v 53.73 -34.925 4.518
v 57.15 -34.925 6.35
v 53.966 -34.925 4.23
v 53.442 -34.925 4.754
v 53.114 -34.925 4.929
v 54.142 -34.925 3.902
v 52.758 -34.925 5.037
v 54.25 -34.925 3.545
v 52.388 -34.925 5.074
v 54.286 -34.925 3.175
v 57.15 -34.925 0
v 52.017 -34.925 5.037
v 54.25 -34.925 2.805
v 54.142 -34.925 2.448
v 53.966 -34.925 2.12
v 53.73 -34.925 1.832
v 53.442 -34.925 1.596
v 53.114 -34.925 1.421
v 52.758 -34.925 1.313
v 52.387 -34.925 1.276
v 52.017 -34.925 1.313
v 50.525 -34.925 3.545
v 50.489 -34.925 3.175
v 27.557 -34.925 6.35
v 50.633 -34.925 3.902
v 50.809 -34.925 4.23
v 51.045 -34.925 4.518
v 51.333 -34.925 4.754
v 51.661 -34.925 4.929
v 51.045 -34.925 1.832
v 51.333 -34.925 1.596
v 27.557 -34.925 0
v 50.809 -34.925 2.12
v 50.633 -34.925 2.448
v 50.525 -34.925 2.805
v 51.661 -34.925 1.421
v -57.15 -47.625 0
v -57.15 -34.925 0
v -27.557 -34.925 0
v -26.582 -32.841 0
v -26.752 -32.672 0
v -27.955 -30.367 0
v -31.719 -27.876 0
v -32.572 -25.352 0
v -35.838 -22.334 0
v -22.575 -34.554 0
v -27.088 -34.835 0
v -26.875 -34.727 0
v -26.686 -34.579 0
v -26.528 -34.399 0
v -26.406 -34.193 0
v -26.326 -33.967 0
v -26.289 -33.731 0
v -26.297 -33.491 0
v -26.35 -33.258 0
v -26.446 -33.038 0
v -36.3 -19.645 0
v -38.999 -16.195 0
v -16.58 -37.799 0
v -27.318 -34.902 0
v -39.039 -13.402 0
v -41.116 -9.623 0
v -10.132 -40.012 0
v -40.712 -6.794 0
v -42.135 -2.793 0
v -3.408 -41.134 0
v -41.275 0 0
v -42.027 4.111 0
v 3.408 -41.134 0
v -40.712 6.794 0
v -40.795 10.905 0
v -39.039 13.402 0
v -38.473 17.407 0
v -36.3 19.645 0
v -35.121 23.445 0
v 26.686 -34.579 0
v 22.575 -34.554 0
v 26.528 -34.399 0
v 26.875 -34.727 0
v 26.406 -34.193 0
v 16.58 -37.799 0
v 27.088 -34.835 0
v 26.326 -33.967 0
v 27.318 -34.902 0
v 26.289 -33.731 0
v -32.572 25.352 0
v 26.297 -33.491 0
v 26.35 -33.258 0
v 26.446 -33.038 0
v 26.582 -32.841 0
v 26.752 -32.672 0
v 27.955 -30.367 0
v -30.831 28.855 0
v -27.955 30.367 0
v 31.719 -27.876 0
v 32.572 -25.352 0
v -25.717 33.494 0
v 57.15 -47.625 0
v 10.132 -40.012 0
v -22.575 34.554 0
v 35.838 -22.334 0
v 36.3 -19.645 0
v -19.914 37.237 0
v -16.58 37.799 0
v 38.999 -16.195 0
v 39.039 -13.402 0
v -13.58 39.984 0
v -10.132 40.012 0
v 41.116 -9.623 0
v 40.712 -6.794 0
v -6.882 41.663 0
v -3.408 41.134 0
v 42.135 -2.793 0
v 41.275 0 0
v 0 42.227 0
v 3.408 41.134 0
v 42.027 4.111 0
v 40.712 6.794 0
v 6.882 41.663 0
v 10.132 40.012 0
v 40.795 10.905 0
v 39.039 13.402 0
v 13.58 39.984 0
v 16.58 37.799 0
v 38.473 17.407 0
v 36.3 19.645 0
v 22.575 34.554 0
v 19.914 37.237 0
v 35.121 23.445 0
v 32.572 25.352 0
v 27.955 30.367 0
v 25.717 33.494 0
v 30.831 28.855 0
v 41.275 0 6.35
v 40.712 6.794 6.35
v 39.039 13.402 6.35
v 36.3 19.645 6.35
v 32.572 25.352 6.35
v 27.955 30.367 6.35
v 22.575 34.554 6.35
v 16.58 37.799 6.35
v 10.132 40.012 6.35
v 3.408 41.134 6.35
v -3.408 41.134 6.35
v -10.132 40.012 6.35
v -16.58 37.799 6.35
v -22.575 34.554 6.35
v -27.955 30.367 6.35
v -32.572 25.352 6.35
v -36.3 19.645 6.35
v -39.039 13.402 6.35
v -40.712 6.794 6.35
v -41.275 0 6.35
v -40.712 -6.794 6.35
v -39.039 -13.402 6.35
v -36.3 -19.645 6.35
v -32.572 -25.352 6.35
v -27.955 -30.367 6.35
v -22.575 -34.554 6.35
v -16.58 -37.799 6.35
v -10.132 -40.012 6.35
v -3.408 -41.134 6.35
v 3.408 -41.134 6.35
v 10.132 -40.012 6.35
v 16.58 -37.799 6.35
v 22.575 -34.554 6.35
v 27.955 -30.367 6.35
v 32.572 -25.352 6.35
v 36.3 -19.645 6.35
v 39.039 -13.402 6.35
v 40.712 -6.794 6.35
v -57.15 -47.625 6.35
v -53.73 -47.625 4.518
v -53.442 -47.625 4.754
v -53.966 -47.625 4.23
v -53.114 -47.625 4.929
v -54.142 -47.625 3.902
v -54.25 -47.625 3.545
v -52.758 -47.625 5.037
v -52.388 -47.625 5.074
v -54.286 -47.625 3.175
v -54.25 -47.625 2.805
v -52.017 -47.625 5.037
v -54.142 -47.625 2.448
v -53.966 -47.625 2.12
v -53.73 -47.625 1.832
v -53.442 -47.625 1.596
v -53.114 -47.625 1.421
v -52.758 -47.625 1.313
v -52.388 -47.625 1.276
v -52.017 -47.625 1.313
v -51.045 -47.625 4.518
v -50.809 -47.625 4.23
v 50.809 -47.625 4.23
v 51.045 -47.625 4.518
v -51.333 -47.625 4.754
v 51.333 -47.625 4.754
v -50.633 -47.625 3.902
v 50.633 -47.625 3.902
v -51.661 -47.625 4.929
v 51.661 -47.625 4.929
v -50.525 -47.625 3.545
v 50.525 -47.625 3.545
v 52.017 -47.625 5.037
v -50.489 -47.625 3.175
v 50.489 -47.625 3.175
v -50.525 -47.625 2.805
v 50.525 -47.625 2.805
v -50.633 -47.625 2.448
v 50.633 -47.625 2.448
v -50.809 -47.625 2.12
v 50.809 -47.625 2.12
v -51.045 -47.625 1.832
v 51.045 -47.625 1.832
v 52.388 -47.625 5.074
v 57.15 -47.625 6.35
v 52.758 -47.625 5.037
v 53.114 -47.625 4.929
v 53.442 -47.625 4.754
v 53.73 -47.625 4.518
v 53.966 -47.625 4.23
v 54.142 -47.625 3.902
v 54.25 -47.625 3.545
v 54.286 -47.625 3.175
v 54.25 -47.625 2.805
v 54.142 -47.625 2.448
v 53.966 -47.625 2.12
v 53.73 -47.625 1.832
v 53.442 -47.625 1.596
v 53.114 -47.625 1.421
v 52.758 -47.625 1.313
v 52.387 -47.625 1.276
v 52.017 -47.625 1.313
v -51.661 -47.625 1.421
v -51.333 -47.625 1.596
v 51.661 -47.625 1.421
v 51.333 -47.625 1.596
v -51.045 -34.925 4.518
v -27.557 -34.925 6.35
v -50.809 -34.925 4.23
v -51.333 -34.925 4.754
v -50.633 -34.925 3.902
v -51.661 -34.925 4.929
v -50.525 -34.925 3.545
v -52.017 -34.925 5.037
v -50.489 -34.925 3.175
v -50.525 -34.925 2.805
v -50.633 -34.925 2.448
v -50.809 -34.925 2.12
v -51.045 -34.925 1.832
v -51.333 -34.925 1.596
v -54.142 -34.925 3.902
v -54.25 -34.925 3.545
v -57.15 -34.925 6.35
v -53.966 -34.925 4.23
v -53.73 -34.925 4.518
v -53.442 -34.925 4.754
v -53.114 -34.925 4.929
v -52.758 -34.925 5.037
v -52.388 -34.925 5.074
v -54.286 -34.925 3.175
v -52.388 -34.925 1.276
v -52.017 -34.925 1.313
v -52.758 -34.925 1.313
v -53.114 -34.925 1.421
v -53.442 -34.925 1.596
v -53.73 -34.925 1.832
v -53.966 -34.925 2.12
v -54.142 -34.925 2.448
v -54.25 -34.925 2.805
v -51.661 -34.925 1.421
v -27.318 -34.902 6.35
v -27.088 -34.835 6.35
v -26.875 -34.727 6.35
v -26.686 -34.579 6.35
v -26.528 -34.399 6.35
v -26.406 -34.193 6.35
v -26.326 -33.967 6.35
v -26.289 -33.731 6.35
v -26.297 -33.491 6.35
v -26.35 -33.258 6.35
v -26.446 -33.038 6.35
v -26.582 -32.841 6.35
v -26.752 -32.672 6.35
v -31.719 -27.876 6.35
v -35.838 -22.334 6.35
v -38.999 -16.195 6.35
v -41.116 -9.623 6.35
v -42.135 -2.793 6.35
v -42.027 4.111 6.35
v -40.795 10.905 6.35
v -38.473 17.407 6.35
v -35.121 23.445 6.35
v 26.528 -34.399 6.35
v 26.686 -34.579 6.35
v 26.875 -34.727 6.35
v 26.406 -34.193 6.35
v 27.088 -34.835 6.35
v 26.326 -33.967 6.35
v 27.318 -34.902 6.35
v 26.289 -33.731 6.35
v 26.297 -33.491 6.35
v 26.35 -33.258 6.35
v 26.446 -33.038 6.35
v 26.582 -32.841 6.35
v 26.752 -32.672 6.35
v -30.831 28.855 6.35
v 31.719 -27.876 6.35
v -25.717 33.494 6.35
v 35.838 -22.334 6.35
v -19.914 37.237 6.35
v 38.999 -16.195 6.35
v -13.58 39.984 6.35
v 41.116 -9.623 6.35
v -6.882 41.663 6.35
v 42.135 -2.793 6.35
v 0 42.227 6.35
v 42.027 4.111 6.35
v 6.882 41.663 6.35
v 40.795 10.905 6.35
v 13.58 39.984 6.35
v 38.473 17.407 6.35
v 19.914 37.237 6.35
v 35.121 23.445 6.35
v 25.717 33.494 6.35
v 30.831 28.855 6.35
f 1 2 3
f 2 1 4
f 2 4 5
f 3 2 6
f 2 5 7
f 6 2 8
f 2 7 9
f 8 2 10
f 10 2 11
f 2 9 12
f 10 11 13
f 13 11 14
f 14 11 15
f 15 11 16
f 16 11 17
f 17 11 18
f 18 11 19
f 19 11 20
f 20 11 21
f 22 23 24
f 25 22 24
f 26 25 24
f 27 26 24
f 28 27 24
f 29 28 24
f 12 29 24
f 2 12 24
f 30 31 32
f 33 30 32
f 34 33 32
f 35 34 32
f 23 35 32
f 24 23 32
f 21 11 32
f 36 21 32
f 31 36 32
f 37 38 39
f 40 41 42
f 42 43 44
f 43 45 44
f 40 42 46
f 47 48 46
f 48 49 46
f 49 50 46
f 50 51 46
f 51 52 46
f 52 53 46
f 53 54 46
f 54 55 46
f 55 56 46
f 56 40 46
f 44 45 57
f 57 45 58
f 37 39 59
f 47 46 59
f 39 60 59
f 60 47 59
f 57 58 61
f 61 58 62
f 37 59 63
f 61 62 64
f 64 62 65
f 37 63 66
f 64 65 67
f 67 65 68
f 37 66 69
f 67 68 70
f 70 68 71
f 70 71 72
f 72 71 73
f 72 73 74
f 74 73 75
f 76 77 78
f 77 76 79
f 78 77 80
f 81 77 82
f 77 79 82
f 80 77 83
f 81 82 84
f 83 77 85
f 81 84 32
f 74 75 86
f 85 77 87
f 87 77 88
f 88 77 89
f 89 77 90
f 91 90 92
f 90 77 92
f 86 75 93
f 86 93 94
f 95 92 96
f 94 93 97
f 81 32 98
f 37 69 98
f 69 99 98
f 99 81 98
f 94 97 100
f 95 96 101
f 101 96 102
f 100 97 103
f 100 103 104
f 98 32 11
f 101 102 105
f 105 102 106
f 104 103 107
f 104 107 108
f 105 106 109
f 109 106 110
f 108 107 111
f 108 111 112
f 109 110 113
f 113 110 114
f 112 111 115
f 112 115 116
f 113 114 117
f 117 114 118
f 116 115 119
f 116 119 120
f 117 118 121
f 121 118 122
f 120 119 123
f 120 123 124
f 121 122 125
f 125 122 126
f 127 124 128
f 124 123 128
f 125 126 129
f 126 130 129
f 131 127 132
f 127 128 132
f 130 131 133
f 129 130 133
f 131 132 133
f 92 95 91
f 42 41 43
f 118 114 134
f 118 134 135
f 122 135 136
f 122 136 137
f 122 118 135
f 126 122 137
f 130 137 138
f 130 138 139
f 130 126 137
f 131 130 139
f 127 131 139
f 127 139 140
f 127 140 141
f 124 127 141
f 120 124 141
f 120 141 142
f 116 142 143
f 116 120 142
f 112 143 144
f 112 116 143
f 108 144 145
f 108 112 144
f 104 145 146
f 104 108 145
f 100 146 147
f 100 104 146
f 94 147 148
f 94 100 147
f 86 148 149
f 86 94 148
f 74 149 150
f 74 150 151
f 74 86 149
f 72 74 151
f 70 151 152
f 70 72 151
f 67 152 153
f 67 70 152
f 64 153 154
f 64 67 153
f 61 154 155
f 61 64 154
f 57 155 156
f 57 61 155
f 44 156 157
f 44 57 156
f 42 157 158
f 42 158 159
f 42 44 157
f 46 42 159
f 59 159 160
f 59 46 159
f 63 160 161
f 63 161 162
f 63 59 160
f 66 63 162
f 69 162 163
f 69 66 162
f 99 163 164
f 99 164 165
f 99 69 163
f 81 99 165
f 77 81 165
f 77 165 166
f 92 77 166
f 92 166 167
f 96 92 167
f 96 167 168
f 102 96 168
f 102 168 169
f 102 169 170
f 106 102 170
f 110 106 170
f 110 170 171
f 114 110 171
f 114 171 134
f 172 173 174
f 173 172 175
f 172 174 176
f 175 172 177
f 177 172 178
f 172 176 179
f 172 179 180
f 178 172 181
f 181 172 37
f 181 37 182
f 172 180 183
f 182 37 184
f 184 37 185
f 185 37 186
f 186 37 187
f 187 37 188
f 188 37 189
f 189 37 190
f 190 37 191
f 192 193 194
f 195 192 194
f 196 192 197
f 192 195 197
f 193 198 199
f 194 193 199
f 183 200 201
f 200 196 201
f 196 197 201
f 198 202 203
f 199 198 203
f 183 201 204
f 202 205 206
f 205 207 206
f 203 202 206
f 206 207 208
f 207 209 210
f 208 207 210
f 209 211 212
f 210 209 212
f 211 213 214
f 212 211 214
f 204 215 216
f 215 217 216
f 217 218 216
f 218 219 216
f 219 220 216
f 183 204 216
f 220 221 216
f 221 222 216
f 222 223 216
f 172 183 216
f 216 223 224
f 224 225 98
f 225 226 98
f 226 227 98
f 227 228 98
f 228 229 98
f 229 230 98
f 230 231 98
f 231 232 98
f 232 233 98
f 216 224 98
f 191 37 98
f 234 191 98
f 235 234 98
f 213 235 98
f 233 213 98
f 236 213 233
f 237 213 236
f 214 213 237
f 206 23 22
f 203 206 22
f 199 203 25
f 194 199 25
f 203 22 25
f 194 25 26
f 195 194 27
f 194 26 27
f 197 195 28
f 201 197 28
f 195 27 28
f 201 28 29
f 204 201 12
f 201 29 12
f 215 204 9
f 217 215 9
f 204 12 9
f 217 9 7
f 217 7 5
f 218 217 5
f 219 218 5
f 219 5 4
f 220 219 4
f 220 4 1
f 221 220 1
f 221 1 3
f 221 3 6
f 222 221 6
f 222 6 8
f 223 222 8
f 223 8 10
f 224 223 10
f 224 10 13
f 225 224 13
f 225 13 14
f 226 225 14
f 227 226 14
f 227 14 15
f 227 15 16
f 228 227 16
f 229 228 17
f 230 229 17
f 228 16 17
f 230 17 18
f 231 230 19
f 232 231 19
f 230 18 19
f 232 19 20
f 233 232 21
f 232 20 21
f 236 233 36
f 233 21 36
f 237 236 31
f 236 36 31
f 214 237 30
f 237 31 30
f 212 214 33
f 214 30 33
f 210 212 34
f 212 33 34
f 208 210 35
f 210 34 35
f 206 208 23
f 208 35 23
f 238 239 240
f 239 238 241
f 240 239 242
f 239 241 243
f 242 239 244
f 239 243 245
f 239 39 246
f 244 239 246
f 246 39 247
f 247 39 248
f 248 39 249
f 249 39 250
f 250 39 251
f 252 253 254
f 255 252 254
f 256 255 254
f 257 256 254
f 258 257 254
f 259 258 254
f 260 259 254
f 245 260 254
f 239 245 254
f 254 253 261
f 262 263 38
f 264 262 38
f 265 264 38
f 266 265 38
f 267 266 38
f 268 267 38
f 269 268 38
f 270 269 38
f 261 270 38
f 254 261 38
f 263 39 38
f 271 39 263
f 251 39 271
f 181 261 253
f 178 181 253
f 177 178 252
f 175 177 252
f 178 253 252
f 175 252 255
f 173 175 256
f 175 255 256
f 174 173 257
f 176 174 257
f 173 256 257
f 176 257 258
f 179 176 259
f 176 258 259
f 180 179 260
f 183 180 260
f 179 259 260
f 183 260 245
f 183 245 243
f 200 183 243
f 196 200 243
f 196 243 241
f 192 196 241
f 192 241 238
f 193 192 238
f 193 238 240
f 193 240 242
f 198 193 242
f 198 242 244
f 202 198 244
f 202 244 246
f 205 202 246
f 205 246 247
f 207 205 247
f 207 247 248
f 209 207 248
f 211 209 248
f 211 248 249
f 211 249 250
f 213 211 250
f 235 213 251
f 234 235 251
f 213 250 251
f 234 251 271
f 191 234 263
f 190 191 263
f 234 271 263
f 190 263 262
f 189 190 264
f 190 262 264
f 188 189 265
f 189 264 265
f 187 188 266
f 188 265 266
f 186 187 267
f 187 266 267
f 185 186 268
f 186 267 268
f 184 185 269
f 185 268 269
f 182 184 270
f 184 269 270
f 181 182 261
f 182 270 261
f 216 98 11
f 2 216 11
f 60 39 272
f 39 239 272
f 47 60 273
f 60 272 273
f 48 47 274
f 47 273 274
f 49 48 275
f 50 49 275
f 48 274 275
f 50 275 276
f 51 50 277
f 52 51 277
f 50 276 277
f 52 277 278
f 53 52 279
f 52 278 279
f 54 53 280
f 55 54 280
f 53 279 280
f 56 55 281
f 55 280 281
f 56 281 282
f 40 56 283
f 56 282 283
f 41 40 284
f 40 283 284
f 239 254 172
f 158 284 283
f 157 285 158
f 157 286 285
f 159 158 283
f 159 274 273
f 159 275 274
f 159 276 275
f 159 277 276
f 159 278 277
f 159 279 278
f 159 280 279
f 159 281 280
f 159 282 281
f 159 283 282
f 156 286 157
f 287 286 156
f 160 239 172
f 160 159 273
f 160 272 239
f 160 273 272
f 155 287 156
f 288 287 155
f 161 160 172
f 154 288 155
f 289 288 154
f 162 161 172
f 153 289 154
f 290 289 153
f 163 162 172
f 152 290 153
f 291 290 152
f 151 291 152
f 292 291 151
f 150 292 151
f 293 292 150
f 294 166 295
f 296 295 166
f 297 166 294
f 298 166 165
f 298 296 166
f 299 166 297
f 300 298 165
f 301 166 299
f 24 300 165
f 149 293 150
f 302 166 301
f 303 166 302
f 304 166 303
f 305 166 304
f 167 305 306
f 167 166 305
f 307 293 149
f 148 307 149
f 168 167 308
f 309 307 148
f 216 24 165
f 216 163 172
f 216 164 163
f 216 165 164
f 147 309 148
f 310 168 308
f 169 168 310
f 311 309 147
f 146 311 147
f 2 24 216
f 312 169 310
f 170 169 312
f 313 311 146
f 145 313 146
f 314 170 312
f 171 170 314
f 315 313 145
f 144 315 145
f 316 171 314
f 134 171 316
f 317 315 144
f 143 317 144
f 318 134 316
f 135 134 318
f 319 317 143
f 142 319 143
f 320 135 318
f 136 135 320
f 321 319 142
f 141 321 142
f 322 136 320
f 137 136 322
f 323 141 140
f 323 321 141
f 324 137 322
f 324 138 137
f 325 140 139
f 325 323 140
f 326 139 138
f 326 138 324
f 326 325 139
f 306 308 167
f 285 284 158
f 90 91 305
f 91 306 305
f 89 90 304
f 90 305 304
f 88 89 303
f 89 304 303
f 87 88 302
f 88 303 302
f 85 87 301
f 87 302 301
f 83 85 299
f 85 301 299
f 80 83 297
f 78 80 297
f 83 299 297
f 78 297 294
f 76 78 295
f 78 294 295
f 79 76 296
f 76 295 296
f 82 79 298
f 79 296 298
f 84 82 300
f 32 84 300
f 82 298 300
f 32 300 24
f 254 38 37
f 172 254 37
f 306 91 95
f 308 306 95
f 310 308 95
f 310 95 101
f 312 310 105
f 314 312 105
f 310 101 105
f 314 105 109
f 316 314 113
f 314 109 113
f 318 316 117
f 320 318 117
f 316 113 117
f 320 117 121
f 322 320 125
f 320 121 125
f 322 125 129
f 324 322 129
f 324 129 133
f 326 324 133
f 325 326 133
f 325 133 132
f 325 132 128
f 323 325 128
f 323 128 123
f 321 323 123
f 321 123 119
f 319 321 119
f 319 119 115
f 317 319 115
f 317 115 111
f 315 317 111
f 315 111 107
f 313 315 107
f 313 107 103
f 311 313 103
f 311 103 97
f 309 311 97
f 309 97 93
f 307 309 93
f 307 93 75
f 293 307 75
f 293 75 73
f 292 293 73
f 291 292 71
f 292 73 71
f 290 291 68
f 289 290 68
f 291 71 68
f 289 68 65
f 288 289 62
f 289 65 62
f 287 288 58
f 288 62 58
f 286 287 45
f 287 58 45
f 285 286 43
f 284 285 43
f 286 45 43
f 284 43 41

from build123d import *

# Parameters (mm, degrees)
SKETCH1_R                 = 41.275
BOSS_EXTRUDE1_DEPTH       = 6.35
FILLET1_R                 = 1.27
F_6_CLEARANCE_HOLE1_D     = 3.7973
F_6_CLEARANCE_HOLE1_DEPTH = 25.4
F_6_CLEARANCE_HOLE1_TIP   = 1.140824014


with BuildPart() as part:
    # Sketch1 → Boss-Extrude1 (new body)
    with BuildSketch(Plane.XY):
        with BuildLine():
            Line((-23.736177688, -34.925), (-57.15, -34.925))
            Line((-57.15, -34.925), (-57.15, -47.625))
            Line((-57.15, -47.625), (57.15, -47.625))
            Line((57.15, -47.625), (57.15, -34.925))
            Line((57.15, -34.925), (23.736177688, -34.925))
            ThreePointArc((23.736177688, -34.925), (0, 42.2275), (-23.736177688, -34.925))
        make_face()
        Circle(SKETCH1_R, mode=Mode.SUBTRACT)
    extrude(amount=BOSS_EXTRUDE1_DEPTH)

    # Fillet1
    fillet1_edges = [part.edges().sort_by_distance(p)[0] for p in [
        (-23.736177688, -34.925, 3.175),
        (23.736177688, -34.925, 3.175),
    ]]
    fillet(fillet1_edges, radius=FILLET1_R)

    # #6 Clearance Hole1
    with Locations(Plane.XZ.offset(47.625)):
        with Locations((-52.3875, 3.175), (52.3875, 3.175)):
            Hole(F_6_CLEARANCE_HOLE1_D / 2, depth=F_6_CLEARANCE_HOLE1_DEPTH)
            with Locations((0, 0, -(F_6_CLEARANCE_HOLE1_DEPTH + F_6_CLEARANCE_HOLE1_TIP / 2))):  # 118° drill point
                Cone(0, F_6_CLEARANCE_HOLE1_D / 2, F_6_CLEARANCE_HOLE1_TIP, mode=Mode.SUBTRACT)


solid = part.part
